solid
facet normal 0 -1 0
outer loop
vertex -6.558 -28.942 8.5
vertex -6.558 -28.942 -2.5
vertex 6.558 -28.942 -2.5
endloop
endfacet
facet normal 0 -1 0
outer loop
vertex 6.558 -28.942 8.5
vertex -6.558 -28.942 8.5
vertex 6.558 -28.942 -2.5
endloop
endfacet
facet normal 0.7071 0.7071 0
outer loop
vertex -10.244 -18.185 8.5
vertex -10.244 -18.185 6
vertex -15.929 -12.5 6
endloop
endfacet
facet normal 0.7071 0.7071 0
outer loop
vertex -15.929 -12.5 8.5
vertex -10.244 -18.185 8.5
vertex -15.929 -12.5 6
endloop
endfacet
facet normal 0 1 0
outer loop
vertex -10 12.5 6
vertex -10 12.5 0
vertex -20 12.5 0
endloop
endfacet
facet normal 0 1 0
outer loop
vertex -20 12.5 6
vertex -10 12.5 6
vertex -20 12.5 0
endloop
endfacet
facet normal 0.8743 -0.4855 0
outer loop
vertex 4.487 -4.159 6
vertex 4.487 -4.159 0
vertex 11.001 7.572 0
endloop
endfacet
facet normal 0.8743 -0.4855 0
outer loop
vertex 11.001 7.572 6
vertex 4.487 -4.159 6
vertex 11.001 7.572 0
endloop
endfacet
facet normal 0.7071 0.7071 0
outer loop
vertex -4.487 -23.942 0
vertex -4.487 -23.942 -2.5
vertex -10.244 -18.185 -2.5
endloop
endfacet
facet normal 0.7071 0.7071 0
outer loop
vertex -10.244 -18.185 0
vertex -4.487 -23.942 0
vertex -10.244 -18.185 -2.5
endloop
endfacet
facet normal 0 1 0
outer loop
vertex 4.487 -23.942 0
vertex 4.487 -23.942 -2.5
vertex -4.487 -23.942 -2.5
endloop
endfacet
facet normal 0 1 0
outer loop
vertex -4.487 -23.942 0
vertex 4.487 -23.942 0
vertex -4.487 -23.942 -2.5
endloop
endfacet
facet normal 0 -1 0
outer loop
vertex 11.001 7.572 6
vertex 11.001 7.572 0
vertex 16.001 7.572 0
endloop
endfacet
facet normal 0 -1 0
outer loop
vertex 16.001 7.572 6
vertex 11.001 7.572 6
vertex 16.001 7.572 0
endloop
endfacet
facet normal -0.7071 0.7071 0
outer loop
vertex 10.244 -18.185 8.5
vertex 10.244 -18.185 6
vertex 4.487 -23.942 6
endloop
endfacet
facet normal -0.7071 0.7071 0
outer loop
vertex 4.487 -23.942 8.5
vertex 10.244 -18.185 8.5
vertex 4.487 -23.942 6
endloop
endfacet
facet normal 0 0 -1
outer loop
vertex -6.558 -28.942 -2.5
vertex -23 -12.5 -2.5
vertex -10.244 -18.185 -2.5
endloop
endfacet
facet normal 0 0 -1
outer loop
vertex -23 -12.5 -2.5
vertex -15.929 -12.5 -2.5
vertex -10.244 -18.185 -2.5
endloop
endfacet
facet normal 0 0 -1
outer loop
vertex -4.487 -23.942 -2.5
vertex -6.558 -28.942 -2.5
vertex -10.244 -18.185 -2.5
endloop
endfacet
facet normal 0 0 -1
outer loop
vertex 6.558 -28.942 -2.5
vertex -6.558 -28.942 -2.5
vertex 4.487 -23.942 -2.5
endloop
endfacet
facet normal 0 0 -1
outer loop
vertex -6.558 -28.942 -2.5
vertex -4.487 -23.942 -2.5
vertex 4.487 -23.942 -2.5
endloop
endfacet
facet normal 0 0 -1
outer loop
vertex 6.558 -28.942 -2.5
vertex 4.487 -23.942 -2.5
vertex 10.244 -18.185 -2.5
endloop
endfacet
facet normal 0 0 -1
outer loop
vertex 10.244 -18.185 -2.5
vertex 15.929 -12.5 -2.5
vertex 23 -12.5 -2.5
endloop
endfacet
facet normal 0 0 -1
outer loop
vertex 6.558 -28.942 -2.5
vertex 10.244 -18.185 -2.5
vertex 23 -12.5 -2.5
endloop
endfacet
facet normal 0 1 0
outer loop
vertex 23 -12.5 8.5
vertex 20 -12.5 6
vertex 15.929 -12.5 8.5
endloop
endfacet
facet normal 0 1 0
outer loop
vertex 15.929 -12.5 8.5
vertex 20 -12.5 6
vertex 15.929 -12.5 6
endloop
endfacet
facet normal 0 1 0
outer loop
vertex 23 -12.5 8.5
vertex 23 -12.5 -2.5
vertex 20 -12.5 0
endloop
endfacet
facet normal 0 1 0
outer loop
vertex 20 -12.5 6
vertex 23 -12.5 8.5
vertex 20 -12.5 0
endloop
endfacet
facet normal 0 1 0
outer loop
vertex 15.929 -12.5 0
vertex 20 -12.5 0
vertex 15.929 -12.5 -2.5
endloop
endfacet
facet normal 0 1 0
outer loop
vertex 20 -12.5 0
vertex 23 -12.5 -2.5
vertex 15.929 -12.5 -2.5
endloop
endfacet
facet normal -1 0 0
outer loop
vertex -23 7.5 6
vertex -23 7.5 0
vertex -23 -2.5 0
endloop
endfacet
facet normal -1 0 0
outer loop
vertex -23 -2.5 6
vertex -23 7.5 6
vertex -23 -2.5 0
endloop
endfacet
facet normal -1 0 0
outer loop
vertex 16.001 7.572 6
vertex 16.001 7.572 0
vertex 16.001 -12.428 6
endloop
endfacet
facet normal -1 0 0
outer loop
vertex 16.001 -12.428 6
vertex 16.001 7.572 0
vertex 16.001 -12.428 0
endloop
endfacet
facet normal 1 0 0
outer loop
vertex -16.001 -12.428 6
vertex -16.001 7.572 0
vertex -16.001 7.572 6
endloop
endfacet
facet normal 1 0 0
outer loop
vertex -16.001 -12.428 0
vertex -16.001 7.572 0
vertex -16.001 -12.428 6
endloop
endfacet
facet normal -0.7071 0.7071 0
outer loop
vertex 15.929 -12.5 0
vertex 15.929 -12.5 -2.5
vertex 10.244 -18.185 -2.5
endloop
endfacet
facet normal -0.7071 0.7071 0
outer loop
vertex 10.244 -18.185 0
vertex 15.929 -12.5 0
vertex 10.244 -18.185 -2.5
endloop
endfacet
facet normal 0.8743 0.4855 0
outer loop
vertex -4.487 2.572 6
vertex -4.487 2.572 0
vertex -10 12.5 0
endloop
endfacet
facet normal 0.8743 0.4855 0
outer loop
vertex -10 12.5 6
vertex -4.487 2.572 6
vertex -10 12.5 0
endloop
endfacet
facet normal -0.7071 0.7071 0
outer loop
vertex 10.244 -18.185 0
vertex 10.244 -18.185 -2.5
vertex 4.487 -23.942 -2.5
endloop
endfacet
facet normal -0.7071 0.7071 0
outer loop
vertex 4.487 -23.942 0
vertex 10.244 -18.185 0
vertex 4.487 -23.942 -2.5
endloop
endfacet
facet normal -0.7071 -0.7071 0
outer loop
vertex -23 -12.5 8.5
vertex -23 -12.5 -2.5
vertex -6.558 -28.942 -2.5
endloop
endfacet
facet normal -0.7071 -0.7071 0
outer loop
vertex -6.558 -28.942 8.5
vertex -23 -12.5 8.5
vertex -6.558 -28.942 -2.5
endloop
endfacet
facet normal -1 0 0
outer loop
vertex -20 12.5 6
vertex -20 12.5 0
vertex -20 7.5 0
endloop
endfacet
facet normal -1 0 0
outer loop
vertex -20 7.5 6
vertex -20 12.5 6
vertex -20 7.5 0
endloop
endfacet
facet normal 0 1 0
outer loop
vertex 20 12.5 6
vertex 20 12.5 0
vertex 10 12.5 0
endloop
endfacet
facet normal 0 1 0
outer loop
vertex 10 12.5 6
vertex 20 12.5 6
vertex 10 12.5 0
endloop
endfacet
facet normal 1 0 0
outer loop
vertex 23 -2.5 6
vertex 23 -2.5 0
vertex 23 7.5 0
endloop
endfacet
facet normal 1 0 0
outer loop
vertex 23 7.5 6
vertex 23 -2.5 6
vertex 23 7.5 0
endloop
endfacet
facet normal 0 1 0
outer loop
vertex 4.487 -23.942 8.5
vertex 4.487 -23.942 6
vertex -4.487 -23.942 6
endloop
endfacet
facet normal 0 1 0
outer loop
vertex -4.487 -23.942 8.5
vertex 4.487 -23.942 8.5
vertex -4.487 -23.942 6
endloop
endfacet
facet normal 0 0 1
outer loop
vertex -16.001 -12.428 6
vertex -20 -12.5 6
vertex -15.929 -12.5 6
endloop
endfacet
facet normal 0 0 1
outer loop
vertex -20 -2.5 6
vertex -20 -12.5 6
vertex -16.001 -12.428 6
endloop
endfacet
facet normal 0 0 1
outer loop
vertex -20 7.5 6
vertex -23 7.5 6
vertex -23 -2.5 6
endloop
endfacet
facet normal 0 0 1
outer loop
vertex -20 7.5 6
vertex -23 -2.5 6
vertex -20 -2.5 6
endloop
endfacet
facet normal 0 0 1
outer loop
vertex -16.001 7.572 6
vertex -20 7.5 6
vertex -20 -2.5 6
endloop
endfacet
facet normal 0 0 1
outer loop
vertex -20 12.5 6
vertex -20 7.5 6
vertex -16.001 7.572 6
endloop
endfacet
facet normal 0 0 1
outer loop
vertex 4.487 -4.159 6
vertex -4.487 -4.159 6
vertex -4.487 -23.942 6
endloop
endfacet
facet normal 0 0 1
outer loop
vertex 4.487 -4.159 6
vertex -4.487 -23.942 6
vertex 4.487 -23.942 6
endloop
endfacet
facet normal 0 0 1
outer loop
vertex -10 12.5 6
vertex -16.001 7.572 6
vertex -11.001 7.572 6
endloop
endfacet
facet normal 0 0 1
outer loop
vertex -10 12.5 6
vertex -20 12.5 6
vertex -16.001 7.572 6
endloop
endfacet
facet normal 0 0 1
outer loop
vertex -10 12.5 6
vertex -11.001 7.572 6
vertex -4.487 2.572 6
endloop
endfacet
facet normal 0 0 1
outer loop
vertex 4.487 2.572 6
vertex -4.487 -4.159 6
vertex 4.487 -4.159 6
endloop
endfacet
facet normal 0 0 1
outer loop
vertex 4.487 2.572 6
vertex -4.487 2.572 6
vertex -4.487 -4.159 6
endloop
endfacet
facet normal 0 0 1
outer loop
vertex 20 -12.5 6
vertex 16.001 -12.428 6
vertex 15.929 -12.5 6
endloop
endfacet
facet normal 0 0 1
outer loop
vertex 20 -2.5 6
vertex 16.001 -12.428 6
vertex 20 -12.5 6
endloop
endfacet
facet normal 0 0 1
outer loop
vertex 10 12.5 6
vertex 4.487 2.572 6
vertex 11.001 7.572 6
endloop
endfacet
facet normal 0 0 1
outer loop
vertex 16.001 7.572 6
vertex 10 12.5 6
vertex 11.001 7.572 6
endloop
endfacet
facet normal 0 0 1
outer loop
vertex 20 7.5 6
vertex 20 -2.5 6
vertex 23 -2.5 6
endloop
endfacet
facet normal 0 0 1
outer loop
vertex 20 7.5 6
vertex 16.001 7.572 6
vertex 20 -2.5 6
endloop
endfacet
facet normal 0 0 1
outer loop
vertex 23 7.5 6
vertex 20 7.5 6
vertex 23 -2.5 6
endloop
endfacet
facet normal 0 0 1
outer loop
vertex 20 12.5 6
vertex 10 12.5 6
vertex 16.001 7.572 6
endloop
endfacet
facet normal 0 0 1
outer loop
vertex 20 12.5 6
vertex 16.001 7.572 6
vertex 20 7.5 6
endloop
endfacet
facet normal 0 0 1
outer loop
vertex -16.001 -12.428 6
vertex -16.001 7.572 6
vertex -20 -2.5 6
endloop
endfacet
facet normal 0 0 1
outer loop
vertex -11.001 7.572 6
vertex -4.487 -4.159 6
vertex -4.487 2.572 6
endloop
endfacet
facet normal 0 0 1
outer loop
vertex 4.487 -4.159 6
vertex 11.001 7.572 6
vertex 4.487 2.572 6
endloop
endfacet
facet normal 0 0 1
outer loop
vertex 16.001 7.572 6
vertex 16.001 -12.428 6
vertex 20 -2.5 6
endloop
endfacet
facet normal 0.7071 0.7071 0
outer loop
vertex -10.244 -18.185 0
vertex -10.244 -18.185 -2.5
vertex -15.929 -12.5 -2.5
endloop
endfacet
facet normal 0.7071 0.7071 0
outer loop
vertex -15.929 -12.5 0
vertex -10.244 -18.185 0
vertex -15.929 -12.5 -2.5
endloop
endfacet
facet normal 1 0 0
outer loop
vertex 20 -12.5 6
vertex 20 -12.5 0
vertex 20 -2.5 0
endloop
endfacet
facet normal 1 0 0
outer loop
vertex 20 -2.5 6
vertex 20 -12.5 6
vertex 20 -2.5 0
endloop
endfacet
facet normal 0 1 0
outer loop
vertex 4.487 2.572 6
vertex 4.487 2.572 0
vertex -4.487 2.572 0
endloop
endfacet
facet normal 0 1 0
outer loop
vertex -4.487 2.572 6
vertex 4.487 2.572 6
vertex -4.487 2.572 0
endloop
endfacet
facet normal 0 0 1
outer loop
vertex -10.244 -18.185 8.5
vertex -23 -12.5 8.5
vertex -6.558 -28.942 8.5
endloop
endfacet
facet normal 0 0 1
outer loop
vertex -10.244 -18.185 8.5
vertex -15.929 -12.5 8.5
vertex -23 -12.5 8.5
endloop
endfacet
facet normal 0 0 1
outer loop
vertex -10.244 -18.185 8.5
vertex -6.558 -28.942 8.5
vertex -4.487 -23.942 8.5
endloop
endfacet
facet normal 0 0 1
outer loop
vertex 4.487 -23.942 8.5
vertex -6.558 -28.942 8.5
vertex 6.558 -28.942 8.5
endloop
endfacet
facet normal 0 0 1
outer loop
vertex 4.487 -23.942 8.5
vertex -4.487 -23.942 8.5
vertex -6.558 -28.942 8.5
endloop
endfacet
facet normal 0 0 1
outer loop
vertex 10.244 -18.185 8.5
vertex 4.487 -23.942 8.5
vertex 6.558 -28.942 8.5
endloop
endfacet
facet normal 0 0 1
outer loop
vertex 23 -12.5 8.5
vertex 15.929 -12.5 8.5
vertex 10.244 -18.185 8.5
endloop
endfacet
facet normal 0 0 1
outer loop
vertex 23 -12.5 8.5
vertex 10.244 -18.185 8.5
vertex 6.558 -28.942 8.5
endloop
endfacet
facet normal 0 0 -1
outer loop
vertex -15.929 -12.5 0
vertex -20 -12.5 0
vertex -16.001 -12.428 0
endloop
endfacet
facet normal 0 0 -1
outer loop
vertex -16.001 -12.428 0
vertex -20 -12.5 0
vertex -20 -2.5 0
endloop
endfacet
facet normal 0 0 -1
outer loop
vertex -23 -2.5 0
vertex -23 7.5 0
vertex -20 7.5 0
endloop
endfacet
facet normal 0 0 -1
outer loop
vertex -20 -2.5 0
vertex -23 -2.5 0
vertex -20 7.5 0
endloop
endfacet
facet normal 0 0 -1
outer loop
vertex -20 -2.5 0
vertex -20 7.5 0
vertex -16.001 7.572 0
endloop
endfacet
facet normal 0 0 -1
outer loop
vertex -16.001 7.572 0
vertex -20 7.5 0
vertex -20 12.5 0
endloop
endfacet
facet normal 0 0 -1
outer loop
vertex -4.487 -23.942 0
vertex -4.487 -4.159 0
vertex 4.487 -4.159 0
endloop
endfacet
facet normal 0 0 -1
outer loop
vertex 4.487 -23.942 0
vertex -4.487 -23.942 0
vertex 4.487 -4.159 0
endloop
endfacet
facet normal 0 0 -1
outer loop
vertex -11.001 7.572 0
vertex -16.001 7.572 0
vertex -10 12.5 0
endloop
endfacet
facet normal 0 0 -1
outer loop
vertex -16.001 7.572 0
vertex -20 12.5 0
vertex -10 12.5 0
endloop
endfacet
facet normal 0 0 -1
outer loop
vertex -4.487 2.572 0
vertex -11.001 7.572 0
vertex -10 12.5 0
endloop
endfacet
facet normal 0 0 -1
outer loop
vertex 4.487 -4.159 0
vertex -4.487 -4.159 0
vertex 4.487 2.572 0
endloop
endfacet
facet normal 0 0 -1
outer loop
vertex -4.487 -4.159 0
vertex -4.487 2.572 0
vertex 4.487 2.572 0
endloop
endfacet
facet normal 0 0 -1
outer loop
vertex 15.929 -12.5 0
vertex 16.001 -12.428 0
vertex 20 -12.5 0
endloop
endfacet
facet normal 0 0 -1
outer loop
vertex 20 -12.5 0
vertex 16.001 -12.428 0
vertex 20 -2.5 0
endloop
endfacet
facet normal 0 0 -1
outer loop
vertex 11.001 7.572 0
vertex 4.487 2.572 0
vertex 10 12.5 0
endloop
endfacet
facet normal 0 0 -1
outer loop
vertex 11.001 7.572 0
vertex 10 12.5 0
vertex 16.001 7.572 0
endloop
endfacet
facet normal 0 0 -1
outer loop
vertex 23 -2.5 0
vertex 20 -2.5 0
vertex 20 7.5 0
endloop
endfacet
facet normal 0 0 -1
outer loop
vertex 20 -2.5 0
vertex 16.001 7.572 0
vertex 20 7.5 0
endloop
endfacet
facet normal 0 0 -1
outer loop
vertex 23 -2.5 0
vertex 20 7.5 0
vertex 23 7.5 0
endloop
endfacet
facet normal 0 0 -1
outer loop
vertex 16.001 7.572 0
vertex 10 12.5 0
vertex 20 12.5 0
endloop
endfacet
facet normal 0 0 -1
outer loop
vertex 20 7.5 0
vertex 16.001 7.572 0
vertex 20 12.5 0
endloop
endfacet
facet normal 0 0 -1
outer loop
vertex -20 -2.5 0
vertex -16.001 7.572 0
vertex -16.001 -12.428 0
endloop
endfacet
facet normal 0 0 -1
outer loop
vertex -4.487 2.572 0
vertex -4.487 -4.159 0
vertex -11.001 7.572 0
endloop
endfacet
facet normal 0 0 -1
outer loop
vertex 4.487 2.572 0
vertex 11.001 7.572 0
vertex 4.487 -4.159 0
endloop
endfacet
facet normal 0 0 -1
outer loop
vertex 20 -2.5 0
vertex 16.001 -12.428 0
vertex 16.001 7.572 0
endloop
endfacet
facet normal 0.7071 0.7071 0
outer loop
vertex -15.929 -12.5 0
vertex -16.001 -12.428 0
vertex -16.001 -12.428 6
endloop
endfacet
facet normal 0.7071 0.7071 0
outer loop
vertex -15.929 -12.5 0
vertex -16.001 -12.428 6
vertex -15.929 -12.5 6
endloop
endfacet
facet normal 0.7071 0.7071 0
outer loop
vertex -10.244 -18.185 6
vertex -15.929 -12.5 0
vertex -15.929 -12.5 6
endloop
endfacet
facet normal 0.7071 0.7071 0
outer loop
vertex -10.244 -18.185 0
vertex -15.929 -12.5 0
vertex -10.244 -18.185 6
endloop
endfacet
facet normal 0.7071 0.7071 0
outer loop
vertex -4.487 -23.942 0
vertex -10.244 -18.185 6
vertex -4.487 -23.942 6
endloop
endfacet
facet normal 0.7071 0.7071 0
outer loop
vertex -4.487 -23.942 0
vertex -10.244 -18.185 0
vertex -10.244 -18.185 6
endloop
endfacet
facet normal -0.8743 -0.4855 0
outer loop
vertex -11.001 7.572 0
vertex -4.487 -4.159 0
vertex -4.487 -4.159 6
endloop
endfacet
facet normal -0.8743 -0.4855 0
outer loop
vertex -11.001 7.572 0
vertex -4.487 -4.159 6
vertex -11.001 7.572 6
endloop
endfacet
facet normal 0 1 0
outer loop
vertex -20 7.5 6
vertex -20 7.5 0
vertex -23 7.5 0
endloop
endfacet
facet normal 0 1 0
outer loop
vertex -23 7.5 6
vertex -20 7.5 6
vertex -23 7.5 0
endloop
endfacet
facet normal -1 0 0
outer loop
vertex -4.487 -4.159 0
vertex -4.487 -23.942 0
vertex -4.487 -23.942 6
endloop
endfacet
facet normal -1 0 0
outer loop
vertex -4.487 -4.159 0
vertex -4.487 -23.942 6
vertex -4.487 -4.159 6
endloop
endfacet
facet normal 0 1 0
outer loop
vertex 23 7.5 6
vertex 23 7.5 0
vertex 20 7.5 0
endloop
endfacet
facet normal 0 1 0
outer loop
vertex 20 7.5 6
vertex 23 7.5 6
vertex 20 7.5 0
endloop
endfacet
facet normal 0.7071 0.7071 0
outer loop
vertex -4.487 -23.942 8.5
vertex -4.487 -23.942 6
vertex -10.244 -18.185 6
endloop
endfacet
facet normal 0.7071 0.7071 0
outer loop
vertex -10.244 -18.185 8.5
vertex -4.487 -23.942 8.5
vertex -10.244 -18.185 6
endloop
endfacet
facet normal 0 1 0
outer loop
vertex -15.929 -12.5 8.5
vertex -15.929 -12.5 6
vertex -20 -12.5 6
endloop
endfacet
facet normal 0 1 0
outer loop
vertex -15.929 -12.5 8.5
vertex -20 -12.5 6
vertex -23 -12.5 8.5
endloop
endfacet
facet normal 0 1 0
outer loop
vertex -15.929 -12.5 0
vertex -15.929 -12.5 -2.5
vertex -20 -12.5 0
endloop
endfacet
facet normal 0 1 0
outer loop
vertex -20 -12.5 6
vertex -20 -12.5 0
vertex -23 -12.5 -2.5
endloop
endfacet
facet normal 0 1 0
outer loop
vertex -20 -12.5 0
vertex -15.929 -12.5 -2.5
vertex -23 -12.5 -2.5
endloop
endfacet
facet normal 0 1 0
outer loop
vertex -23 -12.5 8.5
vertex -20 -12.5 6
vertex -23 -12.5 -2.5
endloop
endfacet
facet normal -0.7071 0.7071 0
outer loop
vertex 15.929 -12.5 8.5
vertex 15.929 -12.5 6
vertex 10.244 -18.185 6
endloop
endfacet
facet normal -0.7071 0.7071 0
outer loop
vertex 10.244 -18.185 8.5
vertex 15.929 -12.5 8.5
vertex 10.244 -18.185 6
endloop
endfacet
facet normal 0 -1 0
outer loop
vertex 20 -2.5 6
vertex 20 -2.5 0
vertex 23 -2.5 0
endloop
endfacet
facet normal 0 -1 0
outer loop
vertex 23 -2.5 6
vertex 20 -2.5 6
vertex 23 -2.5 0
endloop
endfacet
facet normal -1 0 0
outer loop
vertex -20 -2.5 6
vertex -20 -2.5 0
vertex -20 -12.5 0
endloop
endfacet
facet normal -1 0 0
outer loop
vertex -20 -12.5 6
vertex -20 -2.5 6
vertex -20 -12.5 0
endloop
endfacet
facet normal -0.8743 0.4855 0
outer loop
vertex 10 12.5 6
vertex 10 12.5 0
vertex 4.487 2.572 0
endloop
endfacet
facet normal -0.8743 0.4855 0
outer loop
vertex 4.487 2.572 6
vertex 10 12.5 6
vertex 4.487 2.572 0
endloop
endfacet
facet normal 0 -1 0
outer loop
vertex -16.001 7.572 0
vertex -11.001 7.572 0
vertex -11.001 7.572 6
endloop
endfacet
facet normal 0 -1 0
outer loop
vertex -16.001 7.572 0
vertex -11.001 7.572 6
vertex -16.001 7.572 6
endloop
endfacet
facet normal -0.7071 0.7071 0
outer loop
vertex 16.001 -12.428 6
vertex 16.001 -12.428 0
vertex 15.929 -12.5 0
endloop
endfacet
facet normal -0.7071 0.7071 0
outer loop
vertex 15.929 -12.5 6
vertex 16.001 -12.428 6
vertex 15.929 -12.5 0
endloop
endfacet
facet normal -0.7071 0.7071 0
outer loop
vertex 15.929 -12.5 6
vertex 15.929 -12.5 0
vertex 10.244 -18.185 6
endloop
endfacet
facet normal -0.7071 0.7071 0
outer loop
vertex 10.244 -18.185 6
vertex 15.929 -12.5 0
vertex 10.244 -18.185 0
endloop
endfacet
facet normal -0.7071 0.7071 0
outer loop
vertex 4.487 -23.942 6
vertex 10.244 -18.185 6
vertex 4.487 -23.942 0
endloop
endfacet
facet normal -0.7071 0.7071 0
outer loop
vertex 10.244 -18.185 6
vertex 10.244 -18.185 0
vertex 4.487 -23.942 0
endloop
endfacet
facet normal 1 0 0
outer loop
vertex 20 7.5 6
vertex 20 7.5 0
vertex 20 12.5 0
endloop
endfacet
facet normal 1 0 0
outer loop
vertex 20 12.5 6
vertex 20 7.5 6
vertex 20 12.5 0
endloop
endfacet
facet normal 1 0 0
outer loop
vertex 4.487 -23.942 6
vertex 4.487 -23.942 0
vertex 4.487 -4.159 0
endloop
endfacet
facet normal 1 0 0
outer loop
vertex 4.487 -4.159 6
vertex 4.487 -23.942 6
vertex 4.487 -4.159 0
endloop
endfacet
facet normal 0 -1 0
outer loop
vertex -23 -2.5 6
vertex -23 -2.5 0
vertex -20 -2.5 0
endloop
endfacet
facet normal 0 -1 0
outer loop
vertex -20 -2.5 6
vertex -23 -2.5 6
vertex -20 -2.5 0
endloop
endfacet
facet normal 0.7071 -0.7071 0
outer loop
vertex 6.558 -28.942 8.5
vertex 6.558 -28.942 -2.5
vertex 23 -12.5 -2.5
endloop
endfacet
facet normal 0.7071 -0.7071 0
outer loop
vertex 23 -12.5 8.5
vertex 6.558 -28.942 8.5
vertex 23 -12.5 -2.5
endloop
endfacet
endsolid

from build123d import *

# Parameters (mm, degrees)
BOSS_EXTRUDE1_DEPTH      = 6
BOSS_EXTRUDE2_DEPTH      = 2.5
BOSS_EXTRUDE2_DEPTH_BACK = 8.5


with BuildPart() as part:
    # Sketch1 → Boss-Extrude1 (new body)
    with BuildSketch(Plane.XY):
        Polygon((-20, -12.5), (-23, -12.5), (-6.55813284, -28.94186716), (6.55813284, -28.94186716), (23, -12.5), (20, -12.5), (20, -2.5), (23, -2.5), (23, 7.5), (20, 7.5), (20, 12.5), (10, 12.5), (4.487065029, 2.571710666), (-4.487065029, 2.571710666), (-10, 12.5), (-20, 12.5), (-20, 7.5), (-23, 7.5), (-23, -2.5), (-20, -2.5), align=None)
        Polygon((-16.000642854, -12.428289334), (-4.487065029, -23.94186716), (-4.487065029, -4.158644505), (-11.000642854, 7.571710666), (-16.000642854, 7.571710666), align=None, mode=Mode.SUBTRACT)
        Polygon((16.000642854, -12.428289334), (4.487065029, -23.94186716), (4.487065029, -4.158644505), (11.000642854, 7.571710666), (16.000642854, 7.571710666), align=None, mode=Mode.SUBTRACT)
    extrude(amount=BOSS_EXTRUDE1_DEPTH)

    # Sketch2 → Boss-Extrude2 (add, two sides: drawn at the far end of the back side and taken through both)
    with BuildSketch(Plane.XY.offset(6).offset(-BOSS_EXTRUDE2_DEPTH_BACK)):
        Polygon((-23, -12.5), (-6.55813284, -28.94186716), (6.55813284, -28.94186716), (23, -12.5), (15.928932188, -12.5), (10.243853941, -18.185078247), (4.487065029, -23.94186716), (-4.487065029, -23.94186716), (-10.243853941, -18.185078247), (-15.928932188, -12.5), align=None)
    extrude(amount=BOSS_EXTRUDE2_DEPTH + BOSS_EXTRUDE2_DEPTH_BACK)


solid = part.part
